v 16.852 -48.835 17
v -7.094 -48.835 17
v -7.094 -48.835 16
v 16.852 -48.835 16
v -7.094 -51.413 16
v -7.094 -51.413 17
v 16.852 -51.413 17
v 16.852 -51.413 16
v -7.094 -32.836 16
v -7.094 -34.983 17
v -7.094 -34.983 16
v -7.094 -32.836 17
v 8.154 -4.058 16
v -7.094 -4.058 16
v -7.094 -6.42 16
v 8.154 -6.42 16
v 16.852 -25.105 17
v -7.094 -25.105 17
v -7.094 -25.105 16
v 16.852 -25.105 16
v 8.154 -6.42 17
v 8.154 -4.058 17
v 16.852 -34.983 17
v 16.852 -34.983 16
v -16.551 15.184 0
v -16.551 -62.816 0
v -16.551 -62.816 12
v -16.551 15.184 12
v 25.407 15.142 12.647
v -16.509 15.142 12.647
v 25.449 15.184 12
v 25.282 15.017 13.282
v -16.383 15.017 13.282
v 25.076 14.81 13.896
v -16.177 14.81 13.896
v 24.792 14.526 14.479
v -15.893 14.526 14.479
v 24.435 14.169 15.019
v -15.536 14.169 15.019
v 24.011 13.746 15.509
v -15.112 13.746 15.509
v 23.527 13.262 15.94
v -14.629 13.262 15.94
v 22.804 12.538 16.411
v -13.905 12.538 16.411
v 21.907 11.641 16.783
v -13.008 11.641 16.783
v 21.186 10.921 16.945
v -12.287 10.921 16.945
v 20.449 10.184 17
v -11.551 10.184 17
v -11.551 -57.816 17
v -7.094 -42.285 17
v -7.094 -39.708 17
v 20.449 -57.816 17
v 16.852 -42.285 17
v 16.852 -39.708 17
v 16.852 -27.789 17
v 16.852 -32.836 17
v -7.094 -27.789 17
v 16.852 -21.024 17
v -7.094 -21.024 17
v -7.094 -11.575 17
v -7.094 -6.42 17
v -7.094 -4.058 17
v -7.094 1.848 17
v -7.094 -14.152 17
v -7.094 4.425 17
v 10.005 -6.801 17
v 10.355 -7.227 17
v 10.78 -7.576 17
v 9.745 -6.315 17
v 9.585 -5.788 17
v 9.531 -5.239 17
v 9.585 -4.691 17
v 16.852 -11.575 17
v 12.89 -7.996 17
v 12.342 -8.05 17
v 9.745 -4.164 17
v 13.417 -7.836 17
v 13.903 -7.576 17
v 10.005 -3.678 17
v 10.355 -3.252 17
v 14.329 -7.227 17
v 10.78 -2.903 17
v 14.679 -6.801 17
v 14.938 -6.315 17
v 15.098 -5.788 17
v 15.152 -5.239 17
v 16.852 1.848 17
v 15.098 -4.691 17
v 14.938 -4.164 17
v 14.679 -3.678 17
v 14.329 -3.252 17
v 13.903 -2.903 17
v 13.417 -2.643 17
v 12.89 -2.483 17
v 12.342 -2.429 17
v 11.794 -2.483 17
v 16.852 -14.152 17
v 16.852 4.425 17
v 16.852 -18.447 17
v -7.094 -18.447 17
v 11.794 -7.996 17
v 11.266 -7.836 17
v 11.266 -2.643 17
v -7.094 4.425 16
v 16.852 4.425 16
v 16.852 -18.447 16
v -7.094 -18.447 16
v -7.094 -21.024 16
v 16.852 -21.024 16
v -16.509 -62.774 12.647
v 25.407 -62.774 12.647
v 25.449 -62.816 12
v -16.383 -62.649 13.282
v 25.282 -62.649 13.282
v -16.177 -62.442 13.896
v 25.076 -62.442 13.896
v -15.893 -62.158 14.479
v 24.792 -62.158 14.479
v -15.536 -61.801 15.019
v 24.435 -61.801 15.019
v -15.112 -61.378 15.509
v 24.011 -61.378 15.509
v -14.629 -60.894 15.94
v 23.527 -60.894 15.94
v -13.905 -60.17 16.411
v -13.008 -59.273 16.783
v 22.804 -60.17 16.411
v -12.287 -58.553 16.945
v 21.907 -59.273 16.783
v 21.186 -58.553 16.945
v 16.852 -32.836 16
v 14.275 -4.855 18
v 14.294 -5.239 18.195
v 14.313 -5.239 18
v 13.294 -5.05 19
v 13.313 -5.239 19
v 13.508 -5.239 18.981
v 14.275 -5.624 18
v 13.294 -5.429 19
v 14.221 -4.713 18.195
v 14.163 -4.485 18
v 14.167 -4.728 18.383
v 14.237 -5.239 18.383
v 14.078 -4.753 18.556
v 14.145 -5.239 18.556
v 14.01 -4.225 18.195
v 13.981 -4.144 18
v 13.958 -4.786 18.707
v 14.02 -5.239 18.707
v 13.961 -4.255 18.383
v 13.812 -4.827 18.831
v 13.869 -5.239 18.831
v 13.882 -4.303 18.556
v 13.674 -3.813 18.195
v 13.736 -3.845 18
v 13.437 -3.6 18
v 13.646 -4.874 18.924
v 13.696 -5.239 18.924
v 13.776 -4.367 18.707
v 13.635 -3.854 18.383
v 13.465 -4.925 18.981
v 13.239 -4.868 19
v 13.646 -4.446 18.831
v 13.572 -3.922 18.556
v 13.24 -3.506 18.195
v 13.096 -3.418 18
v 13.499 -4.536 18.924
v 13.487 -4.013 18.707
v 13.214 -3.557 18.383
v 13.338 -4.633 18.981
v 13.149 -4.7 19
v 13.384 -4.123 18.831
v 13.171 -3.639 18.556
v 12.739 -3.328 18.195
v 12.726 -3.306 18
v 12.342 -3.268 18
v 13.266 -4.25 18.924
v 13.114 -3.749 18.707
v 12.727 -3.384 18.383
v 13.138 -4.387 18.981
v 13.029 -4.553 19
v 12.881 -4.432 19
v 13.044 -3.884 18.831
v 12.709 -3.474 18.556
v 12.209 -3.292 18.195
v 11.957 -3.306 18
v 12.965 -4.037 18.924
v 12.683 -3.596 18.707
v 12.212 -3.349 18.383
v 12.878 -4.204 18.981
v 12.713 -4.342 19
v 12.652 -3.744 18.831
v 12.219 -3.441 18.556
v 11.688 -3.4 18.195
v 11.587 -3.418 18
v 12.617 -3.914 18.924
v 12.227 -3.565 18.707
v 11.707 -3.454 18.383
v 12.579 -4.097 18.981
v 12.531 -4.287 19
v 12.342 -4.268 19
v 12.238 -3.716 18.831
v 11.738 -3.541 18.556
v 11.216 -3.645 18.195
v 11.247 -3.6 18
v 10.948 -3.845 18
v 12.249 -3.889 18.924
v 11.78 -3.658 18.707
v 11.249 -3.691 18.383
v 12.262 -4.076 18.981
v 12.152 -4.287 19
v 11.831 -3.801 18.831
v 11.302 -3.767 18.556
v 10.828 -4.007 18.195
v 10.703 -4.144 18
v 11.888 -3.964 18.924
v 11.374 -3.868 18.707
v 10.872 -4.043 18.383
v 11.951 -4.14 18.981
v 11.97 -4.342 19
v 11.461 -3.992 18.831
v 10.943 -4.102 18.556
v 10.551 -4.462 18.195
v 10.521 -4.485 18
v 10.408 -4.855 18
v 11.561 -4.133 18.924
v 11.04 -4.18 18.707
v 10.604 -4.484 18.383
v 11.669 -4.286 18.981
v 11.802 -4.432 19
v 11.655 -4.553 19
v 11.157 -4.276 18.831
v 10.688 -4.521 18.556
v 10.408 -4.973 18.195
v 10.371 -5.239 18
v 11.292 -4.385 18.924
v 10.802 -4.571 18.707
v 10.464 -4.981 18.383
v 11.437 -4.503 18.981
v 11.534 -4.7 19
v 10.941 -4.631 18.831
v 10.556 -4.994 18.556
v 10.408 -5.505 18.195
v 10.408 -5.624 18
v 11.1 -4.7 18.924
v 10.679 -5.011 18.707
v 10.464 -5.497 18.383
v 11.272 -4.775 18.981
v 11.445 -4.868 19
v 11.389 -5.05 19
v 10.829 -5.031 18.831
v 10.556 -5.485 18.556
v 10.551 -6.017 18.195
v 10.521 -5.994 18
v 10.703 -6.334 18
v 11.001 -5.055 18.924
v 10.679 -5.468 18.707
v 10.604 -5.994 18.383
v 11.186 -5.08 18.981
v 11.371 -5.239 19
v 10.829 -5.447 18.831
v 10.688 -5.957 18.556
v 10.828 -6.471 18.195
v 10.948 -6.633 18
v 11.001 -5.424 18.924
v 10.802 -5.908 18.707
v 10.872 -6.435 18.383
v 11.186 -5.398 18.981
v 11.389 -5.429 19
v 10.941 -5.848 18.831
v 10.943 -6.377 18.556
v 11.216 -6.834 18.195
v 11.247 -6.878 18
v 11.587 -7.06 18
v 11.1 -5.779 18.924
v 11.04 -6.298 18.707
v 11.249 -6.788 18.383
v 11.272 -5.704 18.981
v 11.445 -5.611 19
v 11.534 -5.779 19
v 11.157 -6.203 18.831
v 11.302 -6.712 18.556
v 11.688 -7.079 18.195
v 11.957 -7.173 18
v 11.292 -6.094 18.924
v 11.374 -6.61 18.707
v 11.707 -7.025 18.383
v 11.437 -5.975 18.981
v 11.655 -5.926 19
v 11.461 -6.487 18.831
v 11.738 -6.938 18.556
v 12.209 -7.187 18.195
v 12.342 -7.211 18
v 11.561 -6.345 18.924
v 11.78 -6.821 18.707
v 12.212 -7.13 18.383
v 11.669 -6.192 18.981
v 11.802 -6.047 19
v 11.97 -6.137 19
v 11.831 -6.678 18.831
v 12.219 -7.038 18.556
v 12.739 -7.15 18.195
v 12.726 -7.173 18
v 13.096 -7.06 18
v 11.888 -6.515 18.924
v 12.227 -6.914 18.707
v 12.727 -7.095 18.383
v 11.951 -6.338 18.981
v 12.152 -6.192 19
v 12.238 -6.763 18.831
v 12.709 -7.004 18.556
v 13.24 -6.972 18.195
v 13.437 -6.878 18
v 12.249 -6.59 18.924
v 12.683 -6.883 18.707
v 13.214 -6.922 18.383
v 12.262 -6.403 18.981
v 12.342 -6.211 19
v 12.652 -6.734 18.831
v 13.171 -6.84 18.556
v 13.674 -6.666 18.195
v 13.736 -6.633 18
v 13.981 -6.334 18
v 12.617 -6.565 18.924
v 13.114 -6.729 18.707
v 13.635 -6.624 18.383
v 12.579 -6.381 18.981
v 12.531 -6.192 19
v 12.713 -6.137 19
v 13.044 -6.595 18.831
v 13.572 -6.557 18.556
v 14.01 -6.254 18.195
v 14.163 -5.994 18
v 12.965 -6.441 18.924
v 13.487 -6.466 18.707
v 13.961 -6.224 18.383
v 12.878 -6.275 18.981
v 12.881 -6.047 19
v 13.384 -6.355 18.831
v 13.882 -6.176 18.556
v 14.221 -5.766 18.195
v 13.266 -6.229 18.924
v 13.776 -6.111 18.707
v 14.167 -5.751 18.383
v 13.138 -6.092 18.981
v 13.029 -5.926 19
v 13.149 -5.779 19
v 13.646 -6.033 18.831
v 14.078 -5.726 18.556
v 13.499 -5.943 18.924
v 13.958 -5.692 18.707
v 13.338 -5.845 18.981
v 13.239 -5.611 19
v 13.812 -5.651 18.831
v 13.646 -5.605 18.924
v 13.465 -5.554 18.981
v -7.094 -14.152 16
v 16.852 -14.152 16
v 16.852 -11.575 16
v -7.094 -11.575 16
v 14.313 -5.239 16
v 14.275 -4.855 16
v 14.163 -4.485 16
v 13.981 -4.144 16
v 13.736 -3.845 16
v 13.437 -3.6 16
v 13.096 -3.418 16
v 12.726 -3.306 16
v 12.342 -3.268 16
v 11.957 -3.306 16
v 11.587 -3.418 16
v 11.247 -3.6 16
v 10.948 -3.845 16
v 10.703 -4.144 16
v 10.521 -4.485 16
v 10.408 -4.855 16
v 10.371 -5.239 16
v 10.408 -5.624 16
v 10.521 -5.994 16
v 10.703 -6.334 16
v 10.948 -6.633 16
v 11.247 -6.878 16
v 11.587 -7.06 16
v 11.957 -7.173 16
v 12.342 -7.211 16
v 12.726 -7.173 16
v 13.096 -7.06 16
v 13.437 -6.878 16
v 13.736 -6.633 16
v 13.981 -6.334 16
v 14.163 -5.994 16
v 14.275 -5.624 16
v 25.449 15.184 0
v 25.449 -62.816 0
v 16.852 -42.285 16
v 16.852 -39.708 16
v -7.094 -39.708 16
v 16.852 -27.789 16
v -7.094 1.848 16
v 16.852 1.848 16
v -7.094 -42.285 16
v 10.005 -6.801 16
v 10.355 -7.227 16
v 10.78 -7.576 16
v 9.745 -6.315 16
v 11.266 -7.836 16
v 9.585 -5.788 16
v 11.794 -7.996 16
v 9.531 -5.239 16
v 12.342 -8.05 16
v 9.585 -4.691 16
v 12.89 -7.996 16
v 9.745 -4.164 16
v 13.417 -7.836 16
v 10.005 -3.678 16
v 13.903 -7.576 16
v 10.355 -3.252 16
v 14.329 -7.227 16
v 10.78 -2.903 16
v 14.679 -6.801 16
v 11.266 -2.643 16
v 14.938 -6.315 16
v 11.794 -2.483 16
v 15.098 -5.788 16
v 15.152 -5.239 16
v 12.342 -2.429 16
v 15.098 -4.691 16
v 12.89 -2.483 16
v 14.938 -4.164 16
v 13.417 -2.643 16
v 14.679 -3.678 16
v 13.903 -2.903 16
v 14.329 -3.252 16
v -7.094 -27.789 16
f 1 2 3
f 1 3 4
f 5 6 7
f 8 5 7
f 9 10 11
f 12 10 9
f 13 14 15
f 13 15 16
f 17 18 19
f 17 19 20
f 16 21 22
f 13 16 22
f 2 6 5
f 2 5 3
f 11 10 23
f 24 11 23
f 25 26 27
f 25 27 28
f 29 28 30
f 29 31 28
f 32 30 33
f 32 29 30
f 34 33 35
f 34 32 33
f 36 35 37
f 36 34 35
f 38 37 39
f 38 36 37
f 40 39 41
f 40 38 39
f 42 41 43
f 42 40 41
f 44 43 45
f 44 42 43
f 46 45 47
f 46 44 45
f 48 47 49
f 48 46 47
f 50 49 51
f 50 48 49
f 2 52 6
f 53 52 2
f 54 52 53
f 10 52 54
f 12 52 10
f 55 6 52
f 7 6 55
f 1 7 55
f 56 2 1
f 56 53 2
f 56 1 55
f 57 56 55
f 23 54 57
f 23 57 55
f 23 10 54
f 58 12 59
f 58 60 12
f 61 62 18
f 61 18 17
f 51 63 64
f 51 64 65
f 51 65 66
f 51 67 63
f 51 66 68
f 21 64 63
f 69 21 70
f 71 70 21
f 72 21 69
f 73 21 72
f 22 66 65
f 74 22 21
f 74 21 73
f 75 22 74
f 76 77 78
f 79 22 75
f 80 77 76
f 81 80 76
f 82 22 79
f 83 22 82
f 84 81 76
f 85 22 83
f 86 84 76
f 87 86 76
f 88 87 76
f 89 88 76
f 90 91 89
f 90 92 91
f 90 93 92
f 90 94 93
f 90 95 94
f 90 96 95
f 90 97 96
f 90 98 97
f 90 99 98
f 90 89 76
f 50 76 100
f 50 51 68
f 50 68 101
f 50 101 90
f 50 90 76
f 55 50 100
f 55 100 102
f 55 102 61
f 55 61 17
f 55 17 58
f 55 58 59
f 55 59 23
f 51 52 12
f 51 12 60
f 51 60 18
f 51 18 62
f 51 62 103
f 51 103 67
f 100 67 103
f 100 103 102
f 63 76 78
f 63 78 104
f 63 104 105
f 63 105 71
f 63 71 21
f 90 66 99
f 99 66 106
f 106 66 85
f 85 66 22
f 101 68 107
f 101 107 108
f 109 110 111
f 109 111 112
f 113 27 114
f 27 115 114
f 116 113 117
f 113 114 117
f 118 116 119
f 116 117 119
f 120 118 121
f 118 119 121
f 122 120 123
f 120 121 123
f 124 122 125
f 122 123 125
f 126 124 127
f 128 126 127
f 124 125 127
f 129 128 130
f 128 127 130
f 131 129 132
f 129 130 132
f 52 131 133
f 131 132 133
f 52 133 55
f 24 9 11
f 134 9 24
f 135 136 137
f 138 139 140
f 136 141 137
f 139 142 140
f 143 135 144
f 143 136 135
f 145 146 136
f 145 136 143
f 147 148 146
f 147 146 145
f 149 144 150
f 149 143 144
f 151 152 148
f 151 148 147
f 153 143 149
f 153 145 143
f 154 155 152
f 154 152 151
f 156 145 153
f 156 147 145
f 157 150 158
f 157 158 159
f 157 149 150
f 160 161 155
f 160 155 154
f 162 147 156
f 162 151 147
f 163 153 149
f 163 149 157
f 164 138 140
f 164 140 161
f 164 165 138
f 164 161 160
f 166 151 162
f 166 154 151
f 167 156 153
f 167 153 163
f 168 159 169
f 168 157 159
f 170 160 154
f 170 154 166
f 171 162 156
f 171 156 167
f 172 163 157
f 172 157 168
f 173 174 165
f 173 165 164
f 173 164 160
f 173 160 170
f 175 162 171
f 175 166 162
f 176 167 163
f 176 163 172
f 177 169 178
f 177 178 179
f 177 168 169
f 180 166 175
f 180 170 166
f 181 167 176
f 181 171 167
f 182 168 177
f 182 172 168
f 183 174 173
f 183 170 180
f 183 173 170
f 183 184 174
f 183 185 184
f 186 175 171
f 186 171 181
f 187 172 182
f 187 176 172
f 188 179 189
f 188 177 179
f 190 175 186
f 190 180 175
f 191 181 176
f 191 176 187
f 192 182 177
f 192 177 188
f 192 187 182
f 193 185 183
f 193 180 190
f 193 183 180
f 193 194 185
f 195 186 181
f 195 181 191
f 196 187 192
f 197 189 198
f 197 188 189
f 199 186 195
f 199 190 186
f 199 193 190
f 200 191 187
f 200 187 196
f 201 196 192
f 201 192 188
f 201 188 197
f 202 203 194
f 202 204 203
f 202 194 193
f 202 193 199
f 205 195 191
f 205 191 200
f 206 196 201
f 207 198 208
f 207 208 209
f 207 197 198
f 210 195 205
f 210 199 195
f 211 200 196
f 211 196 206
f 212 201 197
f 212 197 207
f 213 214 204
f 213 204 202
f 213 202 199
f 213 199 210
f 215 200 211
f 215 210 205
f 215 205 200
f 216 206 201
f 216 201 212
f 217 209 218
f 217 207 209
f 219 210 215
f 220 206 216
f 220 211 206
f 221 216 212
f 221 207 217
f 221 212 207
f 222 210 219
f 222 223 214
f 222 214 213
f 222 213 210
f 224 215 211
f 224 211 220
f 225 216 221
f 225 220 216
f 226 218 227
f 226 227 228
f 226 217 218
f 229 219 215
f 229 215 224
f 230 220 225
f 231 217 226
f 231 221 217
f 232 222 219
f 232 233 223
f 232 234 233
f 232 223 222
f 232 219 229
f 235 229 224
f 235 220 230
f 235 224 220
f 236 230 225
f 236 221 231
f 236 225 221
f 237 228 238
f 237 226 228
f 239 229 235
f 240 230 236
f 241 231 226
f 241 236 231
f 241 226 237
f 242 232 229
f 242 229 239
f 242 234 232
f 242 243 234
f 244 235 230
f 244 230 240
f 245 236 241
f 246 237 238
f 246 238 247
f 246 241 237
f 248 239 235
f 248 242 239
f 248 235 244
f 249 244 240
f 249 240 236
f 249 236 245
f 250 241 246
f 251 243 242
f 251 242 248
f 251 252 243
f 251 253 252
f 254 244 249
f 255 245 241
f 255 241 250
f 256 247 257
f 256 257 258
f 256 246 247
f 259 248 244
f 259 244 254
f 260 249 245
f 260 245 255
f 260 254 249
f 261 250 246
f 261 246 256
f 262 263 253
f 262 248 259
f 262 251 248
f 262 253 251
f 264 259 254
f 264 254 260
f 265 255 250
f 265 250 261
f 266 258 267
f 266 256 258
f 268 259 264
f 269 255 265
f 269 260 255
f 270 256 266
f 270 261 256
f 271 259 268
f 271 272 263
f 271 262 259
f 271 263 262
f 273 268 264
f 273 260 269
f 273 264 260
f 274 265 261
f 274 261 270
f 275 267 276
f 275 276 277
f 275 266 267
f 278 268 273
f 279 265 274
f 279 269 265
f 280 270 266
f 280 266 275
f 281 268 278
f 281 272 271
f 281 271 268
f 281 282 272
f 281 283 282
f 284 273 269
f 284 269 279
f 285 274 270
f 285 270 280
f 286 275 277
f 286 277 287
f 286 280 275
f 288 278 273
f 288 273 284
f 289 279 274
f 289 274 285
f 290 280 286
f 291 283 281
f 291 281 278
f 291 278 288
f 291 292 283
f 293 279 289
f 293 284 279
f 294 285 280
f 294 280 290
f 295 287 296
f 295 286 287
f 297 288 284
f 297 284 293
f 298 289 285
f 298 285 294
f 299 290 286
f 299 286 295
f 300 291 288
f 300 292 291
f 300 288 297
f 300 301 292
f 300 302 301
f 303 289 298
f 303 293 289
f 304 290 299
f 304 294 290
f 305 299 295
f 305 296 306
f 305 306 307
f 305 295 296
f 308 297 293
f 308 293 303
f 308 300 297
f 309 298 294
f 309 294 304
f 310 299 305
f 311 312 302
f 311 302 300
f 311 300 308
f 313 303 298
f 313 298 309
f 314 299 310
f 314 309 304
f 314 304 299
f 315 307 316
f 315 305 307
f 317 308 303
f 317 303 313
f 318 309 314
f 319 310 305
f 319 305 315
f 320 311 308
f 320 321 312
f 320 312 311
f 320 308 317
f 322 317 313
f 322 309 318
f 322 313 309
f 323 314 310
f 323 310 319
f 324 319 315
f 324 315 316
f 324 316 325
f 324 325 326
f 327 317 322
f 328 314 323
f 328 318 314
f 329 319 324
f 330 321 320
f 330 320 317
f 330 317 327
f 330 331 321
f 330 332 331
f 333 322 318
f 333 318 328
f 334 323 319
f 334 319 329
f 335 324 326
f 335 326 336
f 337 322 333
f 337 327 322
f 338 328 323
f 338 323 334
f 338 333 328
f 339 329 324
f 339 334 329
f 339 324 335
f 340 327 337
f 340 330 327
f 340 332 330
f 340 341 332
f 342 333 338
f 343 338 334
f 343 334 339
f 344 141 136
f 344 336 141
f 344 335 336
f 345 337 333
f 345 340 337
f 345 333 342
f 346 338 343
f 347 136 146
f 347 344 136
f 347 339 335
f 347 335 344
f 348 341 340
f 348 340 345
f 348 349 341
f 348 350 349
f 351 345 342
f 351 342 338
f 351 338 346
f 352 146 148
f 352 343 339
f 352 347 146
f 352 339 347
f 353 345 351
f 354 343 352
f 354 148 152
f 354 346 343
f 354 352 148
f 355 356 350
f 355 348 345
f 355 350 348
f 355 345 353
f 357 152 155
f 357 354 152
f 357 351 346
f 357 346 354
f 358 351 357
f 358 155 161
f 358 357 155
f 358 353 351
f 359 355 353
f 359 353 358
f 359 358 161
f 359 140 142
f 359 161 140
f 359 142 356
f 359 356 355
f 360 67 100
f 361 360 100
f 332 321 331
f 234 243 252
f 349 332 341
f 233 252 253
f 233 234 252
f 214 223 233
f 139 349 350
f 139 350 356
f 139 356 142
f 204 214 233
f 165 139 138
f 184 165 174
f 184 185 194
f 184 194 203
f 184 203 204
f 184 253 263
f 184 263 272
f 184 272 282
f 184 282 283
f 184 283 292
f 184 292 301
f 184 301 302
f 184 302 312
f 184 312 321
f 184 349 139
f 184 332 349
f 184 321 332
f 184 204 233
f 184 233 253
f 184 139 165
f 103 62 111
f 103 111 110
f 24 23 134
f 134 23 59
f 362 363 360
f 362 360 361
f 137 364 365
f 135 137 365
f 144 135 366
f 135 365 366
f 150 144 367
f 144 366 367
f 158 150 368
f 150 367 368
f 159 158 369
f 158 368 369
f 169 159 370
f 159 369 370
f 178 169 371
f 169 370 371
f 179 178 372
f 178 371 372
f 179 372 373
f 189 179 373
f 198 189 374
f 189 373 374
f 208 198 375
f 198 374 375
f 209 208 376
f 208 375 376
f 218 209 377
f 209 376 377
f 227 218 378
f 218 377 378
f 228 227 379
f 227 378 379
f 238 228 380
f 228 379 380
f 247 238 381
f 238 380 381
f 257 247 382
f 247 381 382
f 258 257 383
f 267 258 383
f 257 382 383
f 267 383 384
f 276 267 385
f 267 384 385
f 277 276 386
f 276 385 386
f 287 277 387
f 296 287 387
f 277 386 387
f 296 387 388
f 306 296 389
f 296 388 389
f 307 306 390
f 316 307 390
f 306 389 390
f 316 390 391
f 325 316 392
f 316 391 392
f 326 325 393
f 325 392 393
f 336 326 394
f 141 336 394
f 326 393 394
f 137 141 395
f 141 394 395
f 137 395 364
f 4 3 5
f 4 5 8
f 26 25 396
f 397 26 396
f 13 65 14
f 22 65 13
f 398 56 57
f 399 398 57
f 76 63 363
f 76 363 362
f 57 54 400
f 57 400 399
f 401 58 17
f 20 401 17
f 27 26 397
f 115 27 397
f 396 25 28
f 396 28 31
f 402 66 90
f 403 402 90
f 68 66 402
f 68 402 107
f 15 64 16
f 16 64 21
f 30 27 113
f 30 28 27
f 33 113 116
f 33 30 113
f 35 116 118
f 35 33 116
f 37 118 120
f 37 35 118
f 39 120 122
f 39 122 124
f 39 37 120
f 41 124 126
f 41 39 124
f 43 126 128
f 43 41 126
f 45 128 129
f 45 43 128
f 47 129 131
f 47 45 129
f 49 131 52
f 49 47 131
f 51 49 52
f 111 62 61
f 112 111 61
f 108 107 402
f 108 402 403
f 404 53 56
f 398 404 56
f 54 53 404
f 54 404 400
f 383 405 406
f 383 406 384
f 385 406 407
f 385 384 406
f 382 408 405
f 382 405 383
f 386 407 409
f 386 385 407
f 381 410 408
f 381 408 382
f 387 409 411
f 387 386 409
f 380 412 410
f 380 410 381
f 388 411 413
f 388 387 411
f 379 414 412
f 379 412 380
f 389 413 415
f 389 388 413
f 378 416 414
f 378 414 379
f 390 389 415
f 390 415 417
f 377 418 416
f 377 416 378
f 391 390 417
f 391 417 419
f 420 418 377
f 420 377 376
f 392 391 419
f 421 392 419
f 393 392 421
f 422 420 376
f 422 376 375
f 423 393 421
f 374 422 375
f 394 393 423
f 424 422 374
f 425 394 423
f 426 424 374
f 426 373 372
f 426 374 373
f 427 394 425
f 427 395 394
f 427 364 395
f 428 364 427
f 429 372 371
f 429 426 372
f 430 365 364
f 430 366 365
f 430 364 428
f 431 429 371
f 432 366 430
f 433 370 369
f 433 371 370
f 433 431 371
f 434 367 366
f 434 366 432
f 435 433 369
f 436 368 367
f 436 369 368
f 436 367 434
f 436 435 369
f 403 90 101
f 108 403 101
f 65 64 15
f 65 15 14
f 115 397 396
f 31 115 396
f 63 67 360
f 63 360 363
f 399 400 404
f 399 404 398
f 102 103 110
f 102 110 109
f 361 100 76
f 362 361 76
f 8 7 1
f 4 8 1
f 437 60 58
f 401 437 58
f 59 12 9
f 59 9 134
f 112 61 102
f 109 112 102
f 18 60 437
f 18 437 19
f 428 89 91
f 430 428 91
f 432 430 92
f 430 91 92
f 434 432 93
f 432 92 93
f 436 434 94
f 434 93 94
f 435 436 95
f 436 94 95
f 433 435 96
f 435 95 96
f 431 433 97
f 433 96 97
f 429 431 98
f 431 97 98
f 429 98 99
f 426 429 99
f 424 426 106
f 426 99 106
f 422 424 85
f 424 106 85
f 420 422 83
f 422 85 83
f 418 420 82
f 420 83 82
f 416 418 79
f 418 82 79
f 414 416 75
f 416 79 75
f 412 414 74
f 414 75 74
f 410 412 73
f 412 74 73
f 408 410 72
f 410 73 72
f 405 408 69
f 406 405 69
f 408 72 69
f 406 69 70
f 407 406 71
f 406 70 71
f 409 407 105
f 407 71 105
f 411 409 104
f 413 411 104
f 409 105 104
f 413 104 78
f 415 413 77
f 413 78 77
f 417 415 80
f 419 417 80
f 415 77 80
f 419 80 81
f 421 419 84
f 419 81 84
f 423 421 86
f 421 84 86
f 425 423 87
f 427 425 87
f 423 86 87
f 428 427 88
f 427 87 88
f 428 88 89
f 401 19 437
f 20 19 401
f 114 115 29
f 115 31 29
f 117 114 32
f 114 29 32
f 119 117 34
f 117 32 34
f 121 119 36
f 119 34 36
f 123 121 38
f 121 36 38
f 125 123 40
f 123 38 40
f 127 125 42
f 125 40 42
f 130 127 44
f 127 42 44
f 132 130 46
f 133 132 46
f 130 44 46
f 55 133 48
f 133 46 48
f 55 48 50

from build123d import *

# Parameters (mm, degrees)
SKETCH_1_W          = 42
SKETCH_1_H          = 78
EXTRUDE_1_DEPTH     = 17
FILLET_1_R          = 5
SKETCH_2_R          = 2.810395333
SKETCH_2_W          = 23.945669991
SKETCH_2_H          = 2.577112466
SKETCH_2_W_2        = 15.24791542
SKETCH_2_H_2        = 2.362353093
SKETCH_2_H_3        = 2.577112465
SKETCH_2_H_4        = 2.684492151
SKETCH_2_H_5        = 2.147593721
CUT_EXTRUDE_1_DEPTH = 1
SKETCH_3_R          = 1.971229003
EXTRUDE_2_DEPTH     = 3
FILLET_2_R          = 1


with BuildPart() as part:
    # Эскиз1 → Бобышка-Вытянуть1 (new body)
    with BuildSketch(Plane.XY):
        with Locations((4.449416517, -23.815978456)):
            Rectangle(SKETCH_1_W, SKETCH_1_H)
    extrude(amount=EXTRUDE_1_DEPTH)

    # Скругление1
    fillet_1_edges = [part.edges().sort_by_distance(p)[0] for p in [
        (25.449416517, -23.815978456, 17),
        (4.449416517, 15.184021544, 17),
        (-16.550583483, -23.815978456, 17),
        (4.449416517, -62.815978456, 17),
    ]]
    fillet(fillet_1_edges, radius=FILLET_1_R)

    # Эскиз2 → Вырез-Вытянуть1 (cut)
    with BuildSketch(Plane.XY.offset(17)):
        with Locations((12.341823442, -5.239292768)):
            Circle(SKETCH_2_R)
        with Locations((4.878935262, 3.136322744)):
            Rectangle(SKETCH_2_W, SKETCH_2_H)
        with Locations((0.530057976, -5.239292769)):
            Rectangle(SKETCH_2_W_2, SKETCH_2_H_2)
        with Locations((4.878935262, -12.863250478)):
            Rectangle(SKETCH_2_W, SKETCH_2_H_3)
        with Locations((4.878935262, -19.735550386)):
            Rectangle(SKETCH_2_W, SKETCH_2_H)
        with Locations((4.878935262, -26.446780765)):
            Rectangle(SKETCH_2_W, SKETCH_2_H_4)
        with Locations((4.878935262, -33.909668946)):
            Rectangle(SKETCH_2_W, SKETCH_2_H_5)
        with Locations((4.878935262, -40.996728225)):
            Rectangle(SKETCH_2_W, SKETCH_2_H)
        with Locations((4.878935262, -50.12400154)):
            Rectangle(SKETCH_2_W, SKETCH_2_H_3)
    extrude(amount=-CUT_EXTRUDE_1_DEPTH, mode=Mode.SUBTRACT)

    # Эскиз3 → Бобышка-Вытянуть2 (add)
    with BuildSketch(Plane.XY.offset(16)):
        with Locations((12.341823442, -5.239292768)):
            Circle(SKETCH_3_R)
    extrude(amount=EXTRUDE_2_DEPTH)

    # Скругление2
    fillet_2_edges = [part.edges().sort_by_distance(p)[0] for p in [
        (10.370594439, -5.239292768, 19),
    ]]
    fillet(fillet_2_edges, radius=FILLET_2_R)


solid = part.part
